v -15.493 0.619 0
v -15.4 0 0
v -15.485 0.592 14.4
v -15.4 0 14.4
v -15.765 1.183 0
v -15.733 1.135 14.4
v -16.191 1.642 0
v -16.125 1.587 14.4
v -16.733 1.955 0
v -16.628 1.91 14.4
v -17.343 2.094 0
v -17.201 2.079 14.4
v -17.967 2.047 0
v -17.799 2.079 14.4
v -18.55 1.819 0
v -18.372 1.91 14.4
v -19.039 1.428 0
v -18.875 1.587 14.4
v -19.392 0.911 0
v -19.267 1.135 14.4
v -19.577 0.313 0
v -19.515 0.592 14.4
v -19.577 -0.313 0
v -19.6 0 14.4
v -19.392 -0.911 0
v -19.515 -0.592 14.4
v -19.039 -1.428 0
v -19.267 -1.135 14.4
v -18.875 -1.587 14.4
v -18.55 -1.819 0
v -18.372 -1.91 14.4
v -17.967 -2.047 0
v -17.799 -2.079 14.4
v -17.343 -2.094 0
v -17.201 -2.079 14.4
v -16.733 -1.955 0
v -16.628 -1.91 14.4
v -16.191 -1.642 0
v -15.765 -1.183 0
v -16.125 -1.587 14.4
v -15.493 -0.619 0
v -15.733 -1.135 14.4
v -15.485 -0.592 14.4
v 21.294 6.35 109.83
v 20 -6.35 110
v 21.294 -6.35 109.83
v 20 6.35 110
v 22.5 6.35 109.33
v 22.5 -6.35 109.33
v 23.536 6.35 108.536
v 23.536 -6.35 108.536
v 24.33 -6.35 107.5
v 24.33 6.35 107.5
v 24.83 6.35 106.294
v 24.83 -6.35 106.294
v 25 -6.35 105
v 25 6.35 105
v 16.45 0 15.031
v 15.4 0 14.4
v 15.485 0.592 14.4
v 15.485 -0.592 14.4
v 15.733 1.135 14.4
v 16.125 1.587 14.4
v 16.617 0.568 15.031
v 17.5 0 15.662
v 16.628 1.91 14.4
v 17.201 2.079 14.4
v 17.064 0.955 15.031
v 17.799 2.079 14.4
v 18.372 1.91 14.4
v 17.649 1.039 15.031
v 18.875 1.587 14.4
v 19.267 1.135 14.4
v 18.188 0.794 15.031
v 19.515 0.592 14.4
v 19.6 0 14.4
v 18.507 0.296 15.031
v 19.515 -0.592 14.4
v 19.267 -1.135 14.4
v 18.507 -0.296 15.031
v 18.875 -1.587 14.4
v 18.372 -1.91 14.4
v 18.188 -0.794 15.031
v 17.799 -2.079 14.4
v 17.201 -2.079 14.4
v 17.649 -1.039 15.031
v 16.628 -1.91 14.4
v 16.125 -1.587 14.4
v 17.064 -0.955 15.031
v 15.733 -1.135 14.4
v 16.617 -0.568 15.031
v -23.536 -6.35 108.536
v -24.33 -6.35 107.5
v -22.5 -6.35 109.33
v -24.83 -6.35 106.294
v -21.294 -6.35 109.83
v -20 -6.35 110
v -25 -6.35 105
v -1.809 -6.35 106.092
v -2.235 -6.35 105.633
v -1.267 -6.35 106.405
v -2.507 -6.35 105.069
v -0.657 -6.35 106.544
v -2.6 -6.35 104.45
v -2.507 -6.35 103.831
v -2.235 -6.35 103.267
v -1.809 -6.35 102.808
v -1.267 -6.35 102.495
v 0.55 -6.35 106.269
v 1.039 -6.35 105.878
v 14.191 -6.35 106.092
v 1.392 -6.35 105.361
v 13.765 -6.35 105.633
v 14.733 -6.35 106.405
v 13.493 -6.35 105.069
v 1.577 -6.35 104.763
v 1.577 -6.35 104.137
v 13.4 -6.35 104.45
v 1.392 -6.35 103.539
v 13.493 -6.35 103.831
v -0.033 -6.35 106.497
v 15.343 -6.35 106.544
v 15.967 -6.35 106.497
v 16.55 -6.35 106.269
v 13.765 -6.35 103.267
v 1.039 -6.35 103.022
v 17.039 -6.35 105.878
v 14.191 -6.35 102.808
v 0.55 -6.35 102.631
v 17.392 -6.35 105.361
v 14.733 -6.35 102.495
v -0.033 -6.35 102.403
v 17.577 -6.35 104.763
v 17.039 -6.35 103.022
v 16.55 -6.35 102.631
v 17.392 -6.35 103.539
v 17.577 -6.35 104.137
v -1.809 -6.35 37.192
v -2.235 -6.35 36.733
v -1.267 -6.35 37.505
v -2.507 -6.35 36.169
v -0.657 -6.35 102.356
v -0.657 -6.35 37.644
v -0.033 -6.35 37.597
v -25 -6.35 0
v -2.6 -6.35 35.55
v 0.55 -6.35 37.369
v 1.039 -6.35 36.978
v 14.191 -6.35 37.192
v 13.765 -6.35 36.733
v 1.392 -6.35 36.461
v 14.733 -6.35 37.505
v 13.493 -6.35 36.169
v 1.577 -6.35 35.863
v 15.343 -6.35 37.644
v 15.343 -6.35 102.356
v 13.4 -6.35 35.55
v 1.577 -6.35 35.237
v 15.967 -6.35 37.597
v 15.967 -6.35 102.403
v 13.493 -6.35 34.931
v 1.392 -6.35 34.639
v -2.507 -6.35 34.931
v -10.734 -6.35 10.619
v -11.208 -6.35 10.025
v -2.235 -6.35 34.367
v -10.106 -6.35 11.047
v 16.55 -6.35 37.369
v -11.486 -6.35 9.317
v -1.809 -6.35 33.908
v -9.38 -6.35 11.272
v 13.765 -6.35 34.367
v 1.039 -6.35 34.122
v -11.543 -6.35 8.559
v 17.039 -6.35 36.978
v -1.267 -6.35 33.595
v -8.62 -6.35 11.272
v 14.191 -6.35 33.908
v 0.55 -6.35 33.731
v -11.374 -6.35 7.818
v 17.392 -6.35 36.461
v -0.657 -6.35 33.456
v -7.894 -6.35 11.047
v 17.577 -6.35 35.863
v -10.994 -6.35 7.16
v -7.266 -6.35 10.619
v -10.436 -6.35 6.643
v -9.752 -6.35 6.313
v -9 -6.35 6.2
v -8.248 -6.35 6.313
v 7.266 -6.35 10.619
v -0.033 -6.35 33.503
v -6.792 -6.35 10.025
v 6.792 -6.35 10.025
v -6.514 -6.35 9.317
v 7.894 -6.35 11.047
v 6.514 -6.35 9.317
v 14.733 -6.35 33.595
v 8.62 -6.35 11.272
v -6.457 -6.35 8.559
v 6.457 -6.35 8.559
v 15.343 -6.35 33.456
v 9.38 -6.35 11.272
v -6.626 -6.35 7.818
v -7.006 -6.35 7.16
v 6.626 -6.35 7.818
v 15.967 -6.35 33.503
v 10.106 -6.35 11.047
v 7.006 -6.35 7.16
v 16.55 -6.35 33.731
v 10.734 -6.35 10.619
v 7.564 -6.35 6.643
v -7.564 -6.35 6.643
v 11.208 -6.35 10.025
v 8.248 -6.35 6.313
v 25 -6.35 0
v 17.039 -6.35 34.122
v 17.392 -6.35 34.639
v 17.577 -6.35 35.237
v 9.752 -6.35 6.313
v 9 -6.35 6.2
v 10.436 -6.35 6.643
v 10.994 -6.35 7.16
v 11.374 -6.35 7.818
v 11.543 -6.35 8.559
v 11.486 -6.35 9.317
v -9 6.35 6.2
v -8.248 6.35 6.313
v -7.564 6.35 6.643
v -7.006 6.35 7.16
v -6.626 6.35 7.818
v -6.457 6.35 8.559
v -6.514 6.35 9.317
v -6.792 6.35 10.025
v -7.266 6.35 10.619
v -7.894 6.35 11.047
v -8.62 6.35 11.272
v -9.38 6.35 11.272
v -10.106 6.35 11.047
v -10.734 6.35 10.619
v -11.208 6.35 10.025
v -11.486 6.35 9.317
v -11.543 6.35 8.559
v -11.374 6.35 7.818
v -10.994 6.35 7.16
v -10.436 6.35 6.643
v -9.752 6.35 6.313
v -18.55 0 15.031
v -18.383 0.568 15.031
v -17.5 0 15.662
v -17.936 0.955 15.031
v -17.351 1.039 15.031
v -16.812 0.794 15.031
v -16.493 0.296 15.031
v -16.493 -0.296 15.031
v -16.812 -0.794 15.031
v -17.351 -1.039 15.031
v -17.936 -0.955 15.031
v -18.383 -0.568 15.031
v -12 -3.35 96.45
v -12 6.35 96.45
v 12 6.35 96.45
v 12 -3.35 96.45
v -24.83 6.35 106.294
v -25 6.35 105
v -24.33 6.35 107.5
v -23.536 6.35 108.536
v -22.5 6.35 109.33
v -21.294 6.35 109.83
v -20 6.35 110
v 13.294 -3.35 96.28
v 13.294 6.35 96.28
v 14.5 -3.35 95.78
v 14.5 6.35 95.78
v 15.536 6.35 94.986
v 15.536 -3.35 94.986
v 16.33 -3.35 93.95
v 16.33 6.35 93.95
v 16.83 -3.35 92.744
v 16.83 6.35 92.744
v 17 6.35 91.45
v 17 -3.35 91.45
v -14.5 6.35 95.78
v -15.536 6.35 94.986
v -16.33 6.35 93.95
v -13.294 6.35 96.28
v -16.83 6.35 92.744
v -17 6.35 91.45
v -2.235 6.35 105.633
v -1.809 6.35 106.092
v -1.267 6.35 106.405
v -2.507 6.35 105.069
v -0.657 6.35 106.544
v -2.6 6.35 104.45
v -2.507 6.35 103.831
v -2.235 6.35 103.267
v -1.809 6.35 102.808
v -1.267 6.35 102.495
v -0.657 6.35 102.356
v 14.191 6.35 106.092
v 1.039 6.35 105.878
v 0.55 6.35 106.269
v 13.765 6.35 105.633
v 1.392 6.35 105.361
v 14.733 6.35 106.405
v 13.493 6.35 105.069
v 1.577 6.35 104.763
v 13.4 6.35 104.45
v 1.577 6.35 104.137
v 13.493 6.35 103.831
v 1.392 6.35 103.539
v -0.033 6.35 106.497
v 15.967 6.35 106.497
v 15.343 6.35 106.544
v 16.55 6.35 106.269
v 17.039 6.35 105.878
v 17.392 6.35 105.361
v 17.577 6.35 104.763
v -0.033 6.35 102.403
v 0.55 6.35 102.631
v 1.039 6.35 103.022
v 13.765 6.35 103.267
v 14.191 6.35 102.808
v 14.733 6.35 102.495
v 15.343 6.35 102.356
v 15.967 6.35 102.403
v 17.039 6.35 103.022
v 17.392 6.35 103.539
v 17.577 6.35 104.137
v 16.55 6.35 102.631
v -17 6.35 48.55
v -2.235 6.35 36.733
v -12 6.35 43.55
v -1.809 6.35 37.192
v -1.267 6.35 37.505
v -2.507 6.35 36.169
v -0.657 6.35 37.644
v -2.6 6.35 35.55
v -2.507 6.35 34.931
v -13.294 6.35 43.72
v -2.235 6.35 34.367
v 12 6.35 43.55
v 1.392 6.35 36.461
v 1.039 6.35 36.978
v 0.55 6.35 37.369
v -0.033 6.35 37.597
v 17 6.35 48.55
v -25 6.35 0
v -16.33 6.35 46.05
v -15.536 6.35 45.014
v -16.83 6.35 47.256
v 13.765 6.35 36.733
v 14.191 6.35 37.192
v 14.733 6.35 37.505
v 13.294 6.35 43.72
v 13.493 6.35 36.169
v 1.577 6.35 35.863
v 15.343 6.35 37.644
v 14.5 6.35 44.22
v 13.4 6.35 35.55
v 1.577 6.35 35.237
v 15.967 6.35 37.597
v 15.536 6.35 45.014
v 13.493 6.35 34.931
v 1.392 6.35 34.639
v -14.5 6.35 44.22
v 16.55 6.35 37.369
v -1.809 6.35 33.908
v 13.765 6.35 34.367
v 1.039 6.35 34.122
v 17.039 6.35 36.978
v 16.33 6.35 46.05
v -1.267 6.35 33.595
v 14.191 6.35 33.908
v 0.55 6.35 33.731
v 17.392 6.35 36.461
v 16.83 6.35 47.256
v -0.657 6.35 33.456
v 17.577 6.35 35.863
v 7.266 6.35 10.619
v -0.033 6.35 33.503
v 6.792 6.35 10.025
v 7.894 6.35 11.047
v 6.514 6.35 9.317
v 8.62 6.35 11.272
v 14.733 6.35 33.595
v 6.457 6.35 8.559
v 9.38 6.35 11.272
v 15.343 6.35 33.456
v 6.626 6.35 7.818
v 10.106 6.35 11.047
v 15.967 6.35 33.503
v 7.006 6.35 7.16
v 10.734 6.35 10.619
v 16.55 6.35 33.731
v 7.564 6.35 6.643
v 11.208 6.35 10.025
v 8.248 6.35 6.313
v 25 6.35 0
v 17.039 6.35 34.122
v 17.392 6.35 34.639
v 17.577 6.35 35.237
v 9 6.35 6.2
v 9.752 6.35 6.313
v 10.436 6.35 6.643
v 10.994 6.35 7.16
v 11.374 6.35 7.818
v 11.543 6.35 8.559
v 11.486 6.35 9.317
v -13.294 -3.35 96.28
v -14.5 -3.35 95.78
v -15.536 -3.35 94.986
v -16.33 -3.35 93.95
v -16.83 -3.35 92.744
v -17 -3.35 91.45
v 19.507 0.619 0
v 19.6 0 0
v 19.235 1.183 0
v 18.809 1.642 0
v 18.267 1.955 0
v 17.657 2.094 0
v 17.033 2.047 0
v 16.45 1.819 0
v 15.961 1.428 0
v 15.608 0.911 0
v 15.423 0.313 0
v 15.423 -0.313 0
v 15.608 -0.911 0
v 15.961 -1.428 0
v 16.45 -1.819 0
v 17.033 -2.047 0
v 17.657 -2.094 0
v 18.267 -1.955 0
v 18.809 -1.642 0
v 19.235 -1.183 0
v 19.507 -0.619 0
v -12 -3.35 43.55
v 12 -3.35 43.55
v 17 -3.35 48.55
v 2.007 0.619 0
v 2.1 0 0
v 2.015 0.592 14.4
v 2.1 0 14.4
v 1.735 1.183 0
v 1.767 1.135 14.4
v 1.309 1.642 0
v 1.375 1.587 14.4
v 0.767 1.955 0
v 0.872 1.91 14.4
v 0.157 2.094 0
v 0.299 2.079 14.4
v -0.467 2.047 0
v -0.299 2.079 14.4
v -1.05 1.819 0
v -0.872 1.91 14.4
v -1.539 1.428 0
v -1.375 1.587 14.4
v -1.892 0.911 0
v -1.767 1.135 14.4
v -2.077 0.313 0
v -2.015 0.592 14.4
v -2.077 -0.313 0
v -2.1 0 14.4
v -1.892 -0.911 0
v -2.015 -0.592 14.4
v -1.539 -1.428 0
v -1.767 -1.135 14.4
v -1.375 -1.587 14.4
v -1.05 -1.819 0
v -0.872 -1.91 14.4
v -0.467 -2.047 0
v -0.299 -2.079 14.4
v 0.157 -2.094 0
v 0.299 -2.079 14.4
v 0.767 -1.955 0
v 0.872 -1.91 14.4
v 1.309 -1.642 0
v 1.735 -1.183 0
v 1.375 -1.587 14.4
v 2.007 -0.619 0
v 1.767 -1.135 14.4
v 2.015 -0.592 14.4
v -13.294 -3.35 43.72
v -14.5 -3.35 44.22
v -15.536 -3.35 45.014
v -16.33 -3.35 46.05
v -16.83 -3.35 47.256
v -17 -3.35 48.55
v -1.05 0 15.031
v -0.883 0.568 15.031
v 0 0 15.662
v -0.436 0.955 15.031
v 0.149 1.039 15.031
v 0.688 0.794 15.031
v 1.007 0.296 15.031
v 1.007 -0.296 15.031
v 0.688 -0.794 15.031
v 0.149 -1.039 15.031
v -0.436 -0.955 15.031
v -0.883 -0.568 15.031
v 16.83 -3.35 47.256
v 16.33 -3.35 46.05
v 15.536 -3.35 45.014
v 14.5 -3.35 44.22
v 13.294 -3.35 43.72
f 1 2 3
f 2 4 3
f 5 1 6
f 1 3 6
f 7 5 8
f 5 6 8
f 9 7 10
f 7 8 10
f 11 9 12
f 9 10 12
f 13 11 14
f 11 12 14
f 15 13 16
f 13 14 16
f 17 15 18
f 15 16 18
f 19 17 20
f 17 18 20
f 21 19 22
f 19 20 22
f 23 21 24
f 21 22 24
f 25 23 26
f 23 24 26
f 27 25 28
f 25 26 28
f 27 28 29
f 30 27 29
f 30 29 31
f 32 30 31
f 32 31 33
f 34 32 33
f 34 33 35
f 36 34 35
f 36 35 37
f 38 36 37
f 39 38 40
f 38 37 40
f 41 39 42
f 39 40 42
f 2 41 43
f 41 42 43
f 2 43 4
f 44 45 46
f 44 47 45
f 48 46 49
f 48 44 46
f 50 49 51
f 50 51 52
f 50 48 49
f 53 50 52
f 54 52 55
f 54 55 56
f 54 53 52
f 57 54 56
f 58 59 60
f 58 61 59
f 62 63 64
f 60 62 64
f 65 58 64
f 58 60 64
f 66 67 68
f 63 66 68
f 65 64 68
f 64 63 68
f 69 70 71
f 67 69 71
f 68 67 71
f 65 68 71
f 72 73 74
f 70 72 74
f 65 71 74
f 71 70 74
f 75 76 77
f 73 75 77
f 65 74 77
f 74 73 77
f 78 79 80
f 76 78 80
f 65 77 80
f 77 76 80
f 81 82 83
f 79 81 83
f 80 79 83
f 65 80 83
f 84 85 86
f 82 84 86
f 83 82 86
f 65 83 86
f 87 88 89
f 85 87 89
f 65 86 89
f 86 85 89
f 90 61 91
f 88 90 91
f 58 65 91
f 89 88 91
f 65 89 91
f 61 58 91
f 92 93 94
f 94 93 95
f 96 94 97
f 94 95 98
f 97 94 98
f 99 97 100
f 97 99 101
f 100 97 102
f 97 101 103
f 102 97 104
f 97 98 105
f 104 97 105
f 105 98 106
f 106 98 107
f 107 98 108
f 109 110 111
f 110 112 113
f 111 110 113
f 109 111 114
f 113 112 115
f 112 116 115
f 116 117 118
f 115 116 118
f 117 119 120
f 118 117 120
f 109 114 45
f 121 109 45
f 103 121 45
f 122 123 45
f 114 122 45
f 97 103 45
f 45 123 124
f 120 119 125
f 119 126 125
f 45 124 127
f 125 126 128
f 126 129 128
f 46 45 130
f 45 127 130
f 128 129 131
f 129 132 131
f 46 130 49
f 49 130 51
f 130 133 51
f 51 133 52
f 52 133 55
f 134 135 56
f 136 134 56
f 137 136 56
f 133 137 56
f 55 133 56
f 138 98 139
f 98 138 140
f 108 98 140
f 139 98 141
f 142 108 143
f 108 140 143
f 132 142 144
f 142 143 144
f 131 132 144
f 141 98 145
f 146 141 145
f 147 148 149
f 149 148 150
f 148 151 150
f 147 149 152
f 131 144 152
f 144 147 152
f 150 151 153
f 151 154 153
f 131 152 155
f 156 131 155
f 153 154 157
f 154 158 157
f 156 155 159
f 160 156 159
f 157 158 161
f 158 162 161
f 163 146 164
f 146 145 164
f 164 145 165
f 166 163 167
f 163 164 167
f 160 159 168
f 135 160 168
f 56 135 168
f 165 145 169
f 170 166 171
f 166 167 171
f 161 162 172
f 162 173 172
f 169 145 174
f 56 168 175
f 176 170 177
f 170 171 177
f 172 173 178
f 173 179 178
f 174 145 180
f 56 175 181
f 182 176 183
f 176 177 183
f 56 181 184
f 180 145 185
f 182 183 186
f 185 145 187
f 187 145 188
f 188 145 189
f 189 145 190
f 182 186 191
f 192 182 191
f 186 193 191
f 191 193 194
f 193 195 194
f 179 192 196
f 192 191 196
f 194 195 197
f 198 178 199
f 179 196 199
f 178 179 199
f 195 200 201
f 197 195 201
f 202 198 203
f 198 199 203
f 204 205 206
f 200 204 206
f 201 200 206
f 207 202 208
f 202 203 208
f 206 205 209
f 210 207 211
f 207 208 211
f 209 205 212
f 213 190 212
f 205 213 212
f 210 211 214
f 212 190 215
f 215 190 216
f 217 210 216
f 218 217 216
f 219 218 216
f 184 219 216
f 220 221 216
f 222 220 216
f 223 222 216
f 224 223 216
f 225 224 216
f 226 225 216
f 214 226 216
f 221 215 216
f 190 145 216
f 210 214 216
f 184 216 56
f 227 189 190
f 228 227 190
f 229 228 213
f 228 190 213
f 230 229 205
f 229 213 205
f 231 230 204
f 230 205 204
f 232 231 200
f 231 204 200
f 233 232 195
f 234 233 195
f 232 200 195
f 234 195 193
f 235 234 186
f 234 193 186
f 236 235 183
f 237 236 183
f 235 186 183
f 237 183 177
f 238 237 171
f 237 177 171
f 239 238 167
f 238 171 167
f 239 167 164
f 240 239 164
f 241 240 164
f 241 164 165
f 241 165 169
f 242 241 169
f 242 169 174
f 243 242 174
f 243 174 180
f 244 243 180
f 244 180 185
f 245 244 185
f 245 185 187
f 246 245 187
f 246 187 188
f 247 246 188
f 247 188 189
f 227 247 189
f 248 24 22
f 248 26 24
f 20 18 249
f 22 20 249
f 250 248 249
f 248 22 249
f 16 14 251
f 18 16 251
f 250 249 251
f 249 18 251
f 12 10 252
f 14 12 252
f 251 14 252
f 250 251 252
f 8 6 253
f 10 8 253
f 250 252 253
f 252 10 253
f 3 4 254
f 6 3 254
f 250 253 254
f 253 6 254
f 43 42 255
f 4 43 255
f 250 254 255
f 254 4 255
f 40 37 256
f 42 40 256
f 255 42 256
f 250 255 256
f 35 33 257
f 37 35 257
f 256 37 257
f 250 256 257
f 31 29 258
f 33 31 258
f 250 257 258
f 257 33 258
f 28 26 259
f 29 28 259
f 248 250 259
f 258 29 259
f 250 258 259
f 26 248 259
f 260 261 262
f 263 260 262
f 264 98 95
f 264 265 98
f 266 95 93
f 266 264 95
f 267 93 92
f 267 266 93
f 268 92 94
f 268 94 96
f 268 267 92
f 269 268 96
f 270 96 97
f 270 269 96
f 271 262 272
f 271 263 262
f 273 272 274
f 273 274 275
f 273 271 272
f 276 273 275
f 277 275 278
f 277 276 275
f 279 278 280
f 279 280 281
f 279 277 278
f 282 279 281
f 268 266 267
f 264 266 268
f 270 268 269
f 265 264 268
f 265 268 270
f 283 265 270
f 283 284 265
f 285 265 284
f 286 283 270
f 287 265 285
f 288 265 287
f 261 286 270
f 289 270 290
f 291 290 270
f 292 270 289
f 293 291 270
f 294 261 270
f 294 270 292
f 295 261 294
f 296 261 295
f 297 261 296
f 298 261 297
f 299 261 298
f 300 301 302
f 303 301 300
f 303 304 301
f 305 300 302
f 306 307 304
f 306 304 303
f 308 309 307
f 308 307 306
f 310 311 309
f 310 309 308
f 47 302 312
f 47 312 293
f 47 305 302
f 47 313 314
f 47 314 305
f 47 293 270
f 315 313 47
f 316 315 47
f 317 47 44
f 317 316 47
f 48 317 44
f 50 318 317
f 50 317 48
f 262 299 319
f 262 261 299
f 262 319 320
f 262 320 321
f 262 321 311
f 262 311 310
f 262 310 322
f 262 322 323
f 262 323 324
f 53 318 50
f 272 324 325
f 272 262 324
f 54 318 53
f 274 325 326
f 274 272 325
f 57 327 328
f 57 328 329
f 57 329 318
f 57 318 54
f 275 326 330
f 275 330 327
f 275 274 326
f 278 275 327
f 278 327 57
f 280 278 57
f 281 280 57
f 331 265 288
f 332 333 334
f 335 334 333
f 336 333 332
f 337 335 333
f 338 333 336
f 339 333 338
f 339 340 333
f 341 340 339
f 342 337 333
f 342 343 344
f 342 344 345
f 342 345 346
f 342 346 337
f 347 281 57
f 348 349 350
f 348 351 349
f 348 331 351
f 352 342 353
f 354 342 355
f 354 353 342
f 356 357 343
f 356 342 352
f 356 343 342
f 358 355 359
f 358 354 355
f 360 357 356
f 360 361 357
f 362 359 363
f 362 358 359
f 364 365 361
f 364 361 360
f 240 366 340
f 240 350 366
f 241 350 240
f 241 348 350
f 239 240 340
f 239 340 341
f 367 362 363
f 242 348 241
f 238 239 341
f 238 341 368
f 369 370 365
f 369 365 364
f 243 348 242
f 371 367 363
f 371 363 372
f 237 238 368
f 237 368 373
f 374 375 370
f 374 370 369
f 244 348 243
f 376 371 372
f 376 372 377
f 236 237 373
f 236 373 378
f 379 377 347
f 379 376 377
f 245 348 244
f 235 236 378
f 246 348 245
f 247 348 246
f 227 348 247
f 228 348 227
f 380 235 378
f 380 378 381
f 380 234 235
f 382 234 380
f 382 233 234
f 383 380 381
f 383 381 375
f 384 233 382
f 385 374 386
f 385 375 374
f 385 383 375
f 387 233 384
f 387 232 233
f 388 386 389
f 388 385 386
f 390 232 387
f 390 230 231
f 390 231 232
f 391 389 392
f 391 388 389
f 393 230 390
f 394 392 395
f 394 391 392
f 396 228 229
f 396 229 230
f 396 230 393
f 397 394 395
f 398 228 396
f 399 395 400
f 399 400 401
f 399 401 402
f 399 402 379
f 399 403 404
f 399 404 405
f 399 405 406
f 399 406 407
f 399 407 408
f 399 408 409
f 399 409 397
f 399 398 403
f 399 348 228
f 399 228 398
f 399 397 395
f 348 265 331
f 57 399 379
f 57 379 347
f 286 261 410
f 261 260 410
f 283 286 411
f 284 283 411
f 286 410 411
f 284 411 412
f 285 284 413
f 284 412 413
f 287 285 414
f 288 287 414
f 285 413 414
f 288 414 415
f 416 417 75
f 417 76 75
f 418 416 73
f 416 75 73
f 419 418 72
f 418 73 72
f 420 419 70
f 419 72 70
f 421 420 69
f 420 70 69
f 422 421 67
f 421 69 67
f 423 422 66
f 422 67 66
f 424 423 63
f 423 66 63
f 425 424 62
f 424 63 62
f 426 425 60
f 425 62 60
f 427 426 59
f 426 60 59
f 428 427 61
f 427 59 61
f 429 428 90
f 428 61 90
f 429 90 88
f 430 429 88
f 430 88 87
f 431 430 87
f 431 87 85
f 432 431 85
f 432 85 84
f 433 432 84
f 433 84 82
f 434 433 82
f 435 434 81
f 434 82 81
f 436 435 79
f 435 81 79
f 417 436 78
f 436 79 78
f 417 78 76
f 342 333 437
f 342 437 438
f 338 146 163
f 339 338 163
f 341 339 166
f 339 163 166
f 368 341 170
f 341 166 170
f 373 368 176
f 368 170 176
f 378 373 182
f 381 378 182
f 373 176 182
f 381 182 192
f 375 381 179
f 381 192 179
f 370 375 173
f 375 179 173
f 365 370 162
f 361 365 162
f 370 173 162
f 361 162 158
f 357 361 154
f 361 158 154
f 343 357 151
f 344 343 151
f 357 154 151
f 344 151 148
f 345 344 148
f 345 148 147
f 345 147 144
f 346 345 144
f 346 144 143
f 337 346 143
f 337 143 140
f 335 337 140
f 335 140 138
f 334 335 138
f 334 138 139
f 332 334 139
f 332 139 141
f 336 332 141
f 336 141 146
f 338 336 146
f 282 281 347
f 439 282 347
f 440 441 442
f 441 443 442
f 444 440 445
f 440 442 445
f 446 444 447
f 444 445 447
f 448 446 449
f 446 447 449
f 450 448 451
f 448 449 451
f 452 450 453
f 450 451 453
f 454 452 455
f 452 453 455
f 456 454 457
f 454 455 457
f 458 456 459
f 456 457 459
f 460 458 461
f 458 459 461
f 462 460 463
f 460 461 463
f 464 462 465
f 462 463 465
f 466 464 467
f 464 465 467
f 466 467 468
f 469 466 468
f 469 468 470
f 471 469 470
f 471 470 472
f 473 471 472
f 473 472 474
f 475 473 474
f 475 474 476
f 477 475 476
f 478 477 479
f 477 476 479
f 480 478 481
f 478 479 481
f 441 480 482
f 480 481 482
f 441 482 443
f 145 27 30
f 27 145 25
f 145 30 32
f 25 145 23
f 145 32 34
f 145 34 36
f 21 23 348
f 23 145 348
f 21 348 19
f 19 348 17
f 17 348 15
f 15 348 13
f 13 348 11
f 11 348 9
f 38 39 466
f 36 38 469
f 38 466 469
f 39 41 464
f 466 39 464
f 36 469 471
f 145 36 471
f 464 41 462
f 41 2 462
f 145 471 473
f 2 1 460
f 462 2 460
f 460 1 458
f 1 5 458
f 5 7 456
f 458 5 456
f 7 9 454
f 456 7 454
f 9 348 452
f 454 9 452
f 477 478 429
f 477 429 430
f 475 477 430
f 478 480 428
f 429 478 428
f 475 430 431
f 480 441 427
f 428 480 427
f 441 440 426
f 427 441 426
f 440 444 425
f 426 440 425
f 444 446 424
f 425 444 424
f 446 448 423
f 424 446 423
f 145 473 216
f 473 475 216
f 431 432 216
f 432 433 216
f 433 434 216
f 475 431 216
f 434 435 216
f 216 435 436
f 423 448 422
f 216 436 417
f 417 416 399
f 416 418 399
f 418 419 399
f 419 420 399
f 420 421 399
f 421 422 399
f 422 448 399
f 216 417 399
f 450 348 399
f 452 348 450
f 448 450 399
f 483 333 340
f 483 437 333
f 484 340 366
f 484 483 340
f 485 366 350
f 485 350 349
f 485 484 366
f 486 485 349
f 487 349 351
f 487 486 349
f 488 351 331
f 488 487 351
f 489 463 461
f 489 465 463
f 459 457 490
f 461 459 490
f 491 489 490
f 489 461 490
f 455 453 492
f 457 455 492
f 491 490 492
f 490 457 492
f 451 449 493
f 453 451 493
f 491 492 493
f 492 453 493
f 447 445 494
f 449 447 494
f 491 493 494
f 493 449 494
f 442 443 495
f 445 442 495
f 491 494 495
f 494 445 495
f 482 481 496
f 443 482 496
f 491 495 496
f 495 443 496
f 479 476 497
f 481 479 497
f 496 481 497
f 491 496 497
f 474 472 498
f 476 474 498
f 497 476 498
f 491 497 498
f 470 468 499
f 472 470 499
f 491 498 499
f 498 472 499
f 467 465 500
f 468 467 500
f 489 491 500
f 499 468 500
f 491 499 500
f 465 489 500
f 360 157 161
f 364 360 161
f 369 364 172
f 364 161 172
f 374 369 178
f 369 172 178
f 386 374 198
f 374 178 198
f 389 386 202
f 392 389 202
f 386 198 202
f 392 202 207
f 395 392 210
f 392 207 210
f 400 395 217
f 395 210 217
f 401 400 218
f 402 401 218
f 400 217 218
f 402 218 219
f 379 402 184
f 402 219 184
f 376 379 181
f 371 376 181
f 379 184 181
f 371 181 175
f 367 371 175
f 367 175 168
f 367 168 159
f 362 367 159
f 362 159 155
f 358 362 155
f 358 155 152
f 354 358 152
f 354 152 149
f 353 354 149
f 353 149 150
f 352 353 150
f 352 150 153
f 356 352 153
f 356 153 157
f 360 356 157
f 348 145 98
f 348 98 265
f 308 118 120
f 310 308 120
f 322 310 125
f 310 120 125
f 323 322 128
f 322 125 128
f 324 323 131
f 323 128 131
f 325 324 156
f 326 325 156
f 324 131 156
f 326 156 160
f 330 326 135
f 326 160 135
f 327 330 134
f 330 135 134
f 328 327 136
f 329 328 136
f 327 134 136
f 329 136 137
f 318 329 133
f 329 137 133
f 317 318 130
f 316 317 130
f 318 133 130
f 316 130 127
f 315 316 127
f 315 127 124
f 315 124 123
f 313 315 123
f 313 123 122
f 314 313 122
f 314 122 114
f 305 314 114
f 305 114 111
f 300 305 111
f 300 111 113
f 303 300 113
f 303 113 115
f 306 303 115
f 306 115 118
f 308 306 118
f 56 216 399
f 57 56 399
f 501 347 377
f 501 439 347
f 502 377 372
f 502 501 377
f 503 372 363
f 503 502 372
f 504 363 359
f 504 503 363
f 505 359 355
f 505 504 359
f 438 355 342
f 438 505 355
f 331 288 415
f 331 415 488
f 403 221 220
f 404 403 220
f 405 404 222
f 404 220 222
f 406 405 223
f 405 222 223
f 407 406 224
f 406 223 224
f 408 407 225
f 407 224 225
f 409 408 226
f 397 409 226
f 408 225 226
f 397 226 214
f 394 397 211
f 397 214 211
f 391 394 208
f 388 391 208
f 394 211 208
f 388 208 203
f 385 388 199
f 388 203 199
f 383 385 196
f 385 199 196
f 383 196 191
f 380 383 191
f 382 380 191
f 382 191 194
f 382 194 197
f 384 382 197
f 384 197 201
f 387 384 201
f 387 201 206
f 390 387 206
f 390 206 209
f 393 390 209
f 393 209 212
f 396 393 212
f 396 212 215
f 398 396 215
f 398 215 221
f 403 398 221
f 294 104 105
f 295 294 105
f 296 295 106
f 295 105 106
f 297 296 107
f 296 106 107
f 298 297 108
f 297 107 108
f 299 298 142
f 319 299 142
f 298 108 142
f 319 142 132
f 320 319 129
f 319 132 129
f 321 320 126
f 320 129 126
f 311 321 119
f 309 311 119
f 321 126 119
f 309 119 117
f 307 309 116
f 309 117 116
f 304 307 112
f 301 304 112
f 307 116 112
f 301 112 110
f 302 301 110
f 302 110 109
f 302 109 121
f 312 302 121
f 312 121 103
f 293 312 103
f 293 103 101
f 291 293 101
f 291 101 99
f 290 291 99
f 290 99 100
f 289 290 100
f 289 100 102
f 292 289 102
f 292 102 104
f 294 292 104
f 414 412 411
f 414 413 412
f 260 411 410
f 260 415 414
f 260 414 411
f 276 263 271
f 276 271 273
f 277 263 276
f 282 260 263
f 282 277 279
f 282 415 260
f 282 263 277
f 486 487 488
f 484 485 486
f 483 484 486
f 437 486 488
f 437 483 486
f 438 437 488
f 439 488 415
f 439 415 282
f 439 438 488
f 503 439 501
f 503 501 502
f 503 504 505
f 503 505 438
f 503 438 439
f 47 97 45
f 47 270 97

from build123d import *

# Parameters (mm, degrees)
SKETCH12_W                = 50
SKETCH12_H                = 12.7
BOSS_EXTRUDE1_DEPTH       = 110
M5X0_8_TAPPED_HOLE2_D     = 4.2
M5X0_8_TAPPED_HOLE2_DEPTH = 14.4
M5X0_8_TAPPED_HOLE2_TIP   = 1.2618073
M5X0_8_TAPPED_HOLE3_D     = 4.2
SKETCH23_R                = 2.55
CUT_EXTRUDE2_DEPTH        = 114.517795962
SKETCH26_W                = 34
SKETCH26_H                = 52.9
CUT_EXTRUDE1_DEPTH        = 9.7
FILLET1_R                 = 5


with BuildPart() as part:
    # Sketch12 → Boss-Extrude1 (new body)
    with BuildSketch(Plane.XY):
        Rectangle(SKETCH12_W, SKETCH12_H)
    extrude(amount=BOSS_EXTRUDE1_DEPTH)

    # M5x0.8 Tapped Hole2
    with Locations(Plane(origin=(0, 0, 0), x_dir=(-1, 0, 0), z_dir=(0, 0, -1))):
        with Locations((-17.5, 0), (0, 0), (17.5, 0)):
            Hole(M5X0_8_TAPPED_HOLE2_D / 2, depth=M5X0_8_TAPPED_HOLE2_DEPTH)
            with Locations((0, 0, -(M5X0_8_TAPPED_HOLE2_DEPTH + M5X0_8_TAPPED_HOLE2_TIP / 2))):  # 118° drill point
                Cone(0, M5X0_8_TAPPED_HOLE2_D / 2, M5X0_8_TAPPED_HOLE2_TIP, mode=Mode.SUBTRACT)

    # M5x0.8 Tapped Hole3 (through all)
    with Locations(Plane(origin=(0, 6.35, 0), x_dir=(1, 0, 0), z_dir=(0, 1, 0))):
        with Locations((-0.5, -35.55), (15.5, -35.55), (15.5, -104.45), (-0.5, -104.45)):
            Hole(M5X0_8_TAPPED_HOLE3_D / 2)

    # Sketch23 → Cut-Extrude2 (cut, through all)
    with BuildSketch(Plane.XZ.offset(6.35)):
        with Locations(Location((-9, 8.75, 0), (0, 0, 270))):
            Circle(SKETCH23_R)
        with Locations(Location((9, 8.75, 0), (0, 0, 270))):
            Circle(SKETCH23_R)
    extrude(amount=-CUT_EXTRUDE2_DEPTH, mode=Mode.SUBTRACT)

    # Sketch26 → Cut-Extrude1 (cut)
    with BuildSketch(Plane(origin=(0, 6.35, 0), x_dir=(1, 0, 0), z_dir=(0, 1, 0))):
        with Locations((0, -70)):
            Rectangle(SKETCH26_W, SKETCH26_H)
    extrude(amount=-CUT_EXTRUDE1_DEPTH, mode=Mode.SUBTRACT)

    # Fillet1
    fillet1_edges = [part.edges().sort_by_distance(p)[0] for p in [
        (-25, 0, 110),
        (25, 0, 110),
        (-17, 1.5, 96.45),
        (-17, 1.5, 43.55),
        (17, 1.5, 43.55),
        (17, 1.5, 96.45),
    ]]
    fillet(fillet1_edges, radius=FILLET1_R)


solid = part.part
